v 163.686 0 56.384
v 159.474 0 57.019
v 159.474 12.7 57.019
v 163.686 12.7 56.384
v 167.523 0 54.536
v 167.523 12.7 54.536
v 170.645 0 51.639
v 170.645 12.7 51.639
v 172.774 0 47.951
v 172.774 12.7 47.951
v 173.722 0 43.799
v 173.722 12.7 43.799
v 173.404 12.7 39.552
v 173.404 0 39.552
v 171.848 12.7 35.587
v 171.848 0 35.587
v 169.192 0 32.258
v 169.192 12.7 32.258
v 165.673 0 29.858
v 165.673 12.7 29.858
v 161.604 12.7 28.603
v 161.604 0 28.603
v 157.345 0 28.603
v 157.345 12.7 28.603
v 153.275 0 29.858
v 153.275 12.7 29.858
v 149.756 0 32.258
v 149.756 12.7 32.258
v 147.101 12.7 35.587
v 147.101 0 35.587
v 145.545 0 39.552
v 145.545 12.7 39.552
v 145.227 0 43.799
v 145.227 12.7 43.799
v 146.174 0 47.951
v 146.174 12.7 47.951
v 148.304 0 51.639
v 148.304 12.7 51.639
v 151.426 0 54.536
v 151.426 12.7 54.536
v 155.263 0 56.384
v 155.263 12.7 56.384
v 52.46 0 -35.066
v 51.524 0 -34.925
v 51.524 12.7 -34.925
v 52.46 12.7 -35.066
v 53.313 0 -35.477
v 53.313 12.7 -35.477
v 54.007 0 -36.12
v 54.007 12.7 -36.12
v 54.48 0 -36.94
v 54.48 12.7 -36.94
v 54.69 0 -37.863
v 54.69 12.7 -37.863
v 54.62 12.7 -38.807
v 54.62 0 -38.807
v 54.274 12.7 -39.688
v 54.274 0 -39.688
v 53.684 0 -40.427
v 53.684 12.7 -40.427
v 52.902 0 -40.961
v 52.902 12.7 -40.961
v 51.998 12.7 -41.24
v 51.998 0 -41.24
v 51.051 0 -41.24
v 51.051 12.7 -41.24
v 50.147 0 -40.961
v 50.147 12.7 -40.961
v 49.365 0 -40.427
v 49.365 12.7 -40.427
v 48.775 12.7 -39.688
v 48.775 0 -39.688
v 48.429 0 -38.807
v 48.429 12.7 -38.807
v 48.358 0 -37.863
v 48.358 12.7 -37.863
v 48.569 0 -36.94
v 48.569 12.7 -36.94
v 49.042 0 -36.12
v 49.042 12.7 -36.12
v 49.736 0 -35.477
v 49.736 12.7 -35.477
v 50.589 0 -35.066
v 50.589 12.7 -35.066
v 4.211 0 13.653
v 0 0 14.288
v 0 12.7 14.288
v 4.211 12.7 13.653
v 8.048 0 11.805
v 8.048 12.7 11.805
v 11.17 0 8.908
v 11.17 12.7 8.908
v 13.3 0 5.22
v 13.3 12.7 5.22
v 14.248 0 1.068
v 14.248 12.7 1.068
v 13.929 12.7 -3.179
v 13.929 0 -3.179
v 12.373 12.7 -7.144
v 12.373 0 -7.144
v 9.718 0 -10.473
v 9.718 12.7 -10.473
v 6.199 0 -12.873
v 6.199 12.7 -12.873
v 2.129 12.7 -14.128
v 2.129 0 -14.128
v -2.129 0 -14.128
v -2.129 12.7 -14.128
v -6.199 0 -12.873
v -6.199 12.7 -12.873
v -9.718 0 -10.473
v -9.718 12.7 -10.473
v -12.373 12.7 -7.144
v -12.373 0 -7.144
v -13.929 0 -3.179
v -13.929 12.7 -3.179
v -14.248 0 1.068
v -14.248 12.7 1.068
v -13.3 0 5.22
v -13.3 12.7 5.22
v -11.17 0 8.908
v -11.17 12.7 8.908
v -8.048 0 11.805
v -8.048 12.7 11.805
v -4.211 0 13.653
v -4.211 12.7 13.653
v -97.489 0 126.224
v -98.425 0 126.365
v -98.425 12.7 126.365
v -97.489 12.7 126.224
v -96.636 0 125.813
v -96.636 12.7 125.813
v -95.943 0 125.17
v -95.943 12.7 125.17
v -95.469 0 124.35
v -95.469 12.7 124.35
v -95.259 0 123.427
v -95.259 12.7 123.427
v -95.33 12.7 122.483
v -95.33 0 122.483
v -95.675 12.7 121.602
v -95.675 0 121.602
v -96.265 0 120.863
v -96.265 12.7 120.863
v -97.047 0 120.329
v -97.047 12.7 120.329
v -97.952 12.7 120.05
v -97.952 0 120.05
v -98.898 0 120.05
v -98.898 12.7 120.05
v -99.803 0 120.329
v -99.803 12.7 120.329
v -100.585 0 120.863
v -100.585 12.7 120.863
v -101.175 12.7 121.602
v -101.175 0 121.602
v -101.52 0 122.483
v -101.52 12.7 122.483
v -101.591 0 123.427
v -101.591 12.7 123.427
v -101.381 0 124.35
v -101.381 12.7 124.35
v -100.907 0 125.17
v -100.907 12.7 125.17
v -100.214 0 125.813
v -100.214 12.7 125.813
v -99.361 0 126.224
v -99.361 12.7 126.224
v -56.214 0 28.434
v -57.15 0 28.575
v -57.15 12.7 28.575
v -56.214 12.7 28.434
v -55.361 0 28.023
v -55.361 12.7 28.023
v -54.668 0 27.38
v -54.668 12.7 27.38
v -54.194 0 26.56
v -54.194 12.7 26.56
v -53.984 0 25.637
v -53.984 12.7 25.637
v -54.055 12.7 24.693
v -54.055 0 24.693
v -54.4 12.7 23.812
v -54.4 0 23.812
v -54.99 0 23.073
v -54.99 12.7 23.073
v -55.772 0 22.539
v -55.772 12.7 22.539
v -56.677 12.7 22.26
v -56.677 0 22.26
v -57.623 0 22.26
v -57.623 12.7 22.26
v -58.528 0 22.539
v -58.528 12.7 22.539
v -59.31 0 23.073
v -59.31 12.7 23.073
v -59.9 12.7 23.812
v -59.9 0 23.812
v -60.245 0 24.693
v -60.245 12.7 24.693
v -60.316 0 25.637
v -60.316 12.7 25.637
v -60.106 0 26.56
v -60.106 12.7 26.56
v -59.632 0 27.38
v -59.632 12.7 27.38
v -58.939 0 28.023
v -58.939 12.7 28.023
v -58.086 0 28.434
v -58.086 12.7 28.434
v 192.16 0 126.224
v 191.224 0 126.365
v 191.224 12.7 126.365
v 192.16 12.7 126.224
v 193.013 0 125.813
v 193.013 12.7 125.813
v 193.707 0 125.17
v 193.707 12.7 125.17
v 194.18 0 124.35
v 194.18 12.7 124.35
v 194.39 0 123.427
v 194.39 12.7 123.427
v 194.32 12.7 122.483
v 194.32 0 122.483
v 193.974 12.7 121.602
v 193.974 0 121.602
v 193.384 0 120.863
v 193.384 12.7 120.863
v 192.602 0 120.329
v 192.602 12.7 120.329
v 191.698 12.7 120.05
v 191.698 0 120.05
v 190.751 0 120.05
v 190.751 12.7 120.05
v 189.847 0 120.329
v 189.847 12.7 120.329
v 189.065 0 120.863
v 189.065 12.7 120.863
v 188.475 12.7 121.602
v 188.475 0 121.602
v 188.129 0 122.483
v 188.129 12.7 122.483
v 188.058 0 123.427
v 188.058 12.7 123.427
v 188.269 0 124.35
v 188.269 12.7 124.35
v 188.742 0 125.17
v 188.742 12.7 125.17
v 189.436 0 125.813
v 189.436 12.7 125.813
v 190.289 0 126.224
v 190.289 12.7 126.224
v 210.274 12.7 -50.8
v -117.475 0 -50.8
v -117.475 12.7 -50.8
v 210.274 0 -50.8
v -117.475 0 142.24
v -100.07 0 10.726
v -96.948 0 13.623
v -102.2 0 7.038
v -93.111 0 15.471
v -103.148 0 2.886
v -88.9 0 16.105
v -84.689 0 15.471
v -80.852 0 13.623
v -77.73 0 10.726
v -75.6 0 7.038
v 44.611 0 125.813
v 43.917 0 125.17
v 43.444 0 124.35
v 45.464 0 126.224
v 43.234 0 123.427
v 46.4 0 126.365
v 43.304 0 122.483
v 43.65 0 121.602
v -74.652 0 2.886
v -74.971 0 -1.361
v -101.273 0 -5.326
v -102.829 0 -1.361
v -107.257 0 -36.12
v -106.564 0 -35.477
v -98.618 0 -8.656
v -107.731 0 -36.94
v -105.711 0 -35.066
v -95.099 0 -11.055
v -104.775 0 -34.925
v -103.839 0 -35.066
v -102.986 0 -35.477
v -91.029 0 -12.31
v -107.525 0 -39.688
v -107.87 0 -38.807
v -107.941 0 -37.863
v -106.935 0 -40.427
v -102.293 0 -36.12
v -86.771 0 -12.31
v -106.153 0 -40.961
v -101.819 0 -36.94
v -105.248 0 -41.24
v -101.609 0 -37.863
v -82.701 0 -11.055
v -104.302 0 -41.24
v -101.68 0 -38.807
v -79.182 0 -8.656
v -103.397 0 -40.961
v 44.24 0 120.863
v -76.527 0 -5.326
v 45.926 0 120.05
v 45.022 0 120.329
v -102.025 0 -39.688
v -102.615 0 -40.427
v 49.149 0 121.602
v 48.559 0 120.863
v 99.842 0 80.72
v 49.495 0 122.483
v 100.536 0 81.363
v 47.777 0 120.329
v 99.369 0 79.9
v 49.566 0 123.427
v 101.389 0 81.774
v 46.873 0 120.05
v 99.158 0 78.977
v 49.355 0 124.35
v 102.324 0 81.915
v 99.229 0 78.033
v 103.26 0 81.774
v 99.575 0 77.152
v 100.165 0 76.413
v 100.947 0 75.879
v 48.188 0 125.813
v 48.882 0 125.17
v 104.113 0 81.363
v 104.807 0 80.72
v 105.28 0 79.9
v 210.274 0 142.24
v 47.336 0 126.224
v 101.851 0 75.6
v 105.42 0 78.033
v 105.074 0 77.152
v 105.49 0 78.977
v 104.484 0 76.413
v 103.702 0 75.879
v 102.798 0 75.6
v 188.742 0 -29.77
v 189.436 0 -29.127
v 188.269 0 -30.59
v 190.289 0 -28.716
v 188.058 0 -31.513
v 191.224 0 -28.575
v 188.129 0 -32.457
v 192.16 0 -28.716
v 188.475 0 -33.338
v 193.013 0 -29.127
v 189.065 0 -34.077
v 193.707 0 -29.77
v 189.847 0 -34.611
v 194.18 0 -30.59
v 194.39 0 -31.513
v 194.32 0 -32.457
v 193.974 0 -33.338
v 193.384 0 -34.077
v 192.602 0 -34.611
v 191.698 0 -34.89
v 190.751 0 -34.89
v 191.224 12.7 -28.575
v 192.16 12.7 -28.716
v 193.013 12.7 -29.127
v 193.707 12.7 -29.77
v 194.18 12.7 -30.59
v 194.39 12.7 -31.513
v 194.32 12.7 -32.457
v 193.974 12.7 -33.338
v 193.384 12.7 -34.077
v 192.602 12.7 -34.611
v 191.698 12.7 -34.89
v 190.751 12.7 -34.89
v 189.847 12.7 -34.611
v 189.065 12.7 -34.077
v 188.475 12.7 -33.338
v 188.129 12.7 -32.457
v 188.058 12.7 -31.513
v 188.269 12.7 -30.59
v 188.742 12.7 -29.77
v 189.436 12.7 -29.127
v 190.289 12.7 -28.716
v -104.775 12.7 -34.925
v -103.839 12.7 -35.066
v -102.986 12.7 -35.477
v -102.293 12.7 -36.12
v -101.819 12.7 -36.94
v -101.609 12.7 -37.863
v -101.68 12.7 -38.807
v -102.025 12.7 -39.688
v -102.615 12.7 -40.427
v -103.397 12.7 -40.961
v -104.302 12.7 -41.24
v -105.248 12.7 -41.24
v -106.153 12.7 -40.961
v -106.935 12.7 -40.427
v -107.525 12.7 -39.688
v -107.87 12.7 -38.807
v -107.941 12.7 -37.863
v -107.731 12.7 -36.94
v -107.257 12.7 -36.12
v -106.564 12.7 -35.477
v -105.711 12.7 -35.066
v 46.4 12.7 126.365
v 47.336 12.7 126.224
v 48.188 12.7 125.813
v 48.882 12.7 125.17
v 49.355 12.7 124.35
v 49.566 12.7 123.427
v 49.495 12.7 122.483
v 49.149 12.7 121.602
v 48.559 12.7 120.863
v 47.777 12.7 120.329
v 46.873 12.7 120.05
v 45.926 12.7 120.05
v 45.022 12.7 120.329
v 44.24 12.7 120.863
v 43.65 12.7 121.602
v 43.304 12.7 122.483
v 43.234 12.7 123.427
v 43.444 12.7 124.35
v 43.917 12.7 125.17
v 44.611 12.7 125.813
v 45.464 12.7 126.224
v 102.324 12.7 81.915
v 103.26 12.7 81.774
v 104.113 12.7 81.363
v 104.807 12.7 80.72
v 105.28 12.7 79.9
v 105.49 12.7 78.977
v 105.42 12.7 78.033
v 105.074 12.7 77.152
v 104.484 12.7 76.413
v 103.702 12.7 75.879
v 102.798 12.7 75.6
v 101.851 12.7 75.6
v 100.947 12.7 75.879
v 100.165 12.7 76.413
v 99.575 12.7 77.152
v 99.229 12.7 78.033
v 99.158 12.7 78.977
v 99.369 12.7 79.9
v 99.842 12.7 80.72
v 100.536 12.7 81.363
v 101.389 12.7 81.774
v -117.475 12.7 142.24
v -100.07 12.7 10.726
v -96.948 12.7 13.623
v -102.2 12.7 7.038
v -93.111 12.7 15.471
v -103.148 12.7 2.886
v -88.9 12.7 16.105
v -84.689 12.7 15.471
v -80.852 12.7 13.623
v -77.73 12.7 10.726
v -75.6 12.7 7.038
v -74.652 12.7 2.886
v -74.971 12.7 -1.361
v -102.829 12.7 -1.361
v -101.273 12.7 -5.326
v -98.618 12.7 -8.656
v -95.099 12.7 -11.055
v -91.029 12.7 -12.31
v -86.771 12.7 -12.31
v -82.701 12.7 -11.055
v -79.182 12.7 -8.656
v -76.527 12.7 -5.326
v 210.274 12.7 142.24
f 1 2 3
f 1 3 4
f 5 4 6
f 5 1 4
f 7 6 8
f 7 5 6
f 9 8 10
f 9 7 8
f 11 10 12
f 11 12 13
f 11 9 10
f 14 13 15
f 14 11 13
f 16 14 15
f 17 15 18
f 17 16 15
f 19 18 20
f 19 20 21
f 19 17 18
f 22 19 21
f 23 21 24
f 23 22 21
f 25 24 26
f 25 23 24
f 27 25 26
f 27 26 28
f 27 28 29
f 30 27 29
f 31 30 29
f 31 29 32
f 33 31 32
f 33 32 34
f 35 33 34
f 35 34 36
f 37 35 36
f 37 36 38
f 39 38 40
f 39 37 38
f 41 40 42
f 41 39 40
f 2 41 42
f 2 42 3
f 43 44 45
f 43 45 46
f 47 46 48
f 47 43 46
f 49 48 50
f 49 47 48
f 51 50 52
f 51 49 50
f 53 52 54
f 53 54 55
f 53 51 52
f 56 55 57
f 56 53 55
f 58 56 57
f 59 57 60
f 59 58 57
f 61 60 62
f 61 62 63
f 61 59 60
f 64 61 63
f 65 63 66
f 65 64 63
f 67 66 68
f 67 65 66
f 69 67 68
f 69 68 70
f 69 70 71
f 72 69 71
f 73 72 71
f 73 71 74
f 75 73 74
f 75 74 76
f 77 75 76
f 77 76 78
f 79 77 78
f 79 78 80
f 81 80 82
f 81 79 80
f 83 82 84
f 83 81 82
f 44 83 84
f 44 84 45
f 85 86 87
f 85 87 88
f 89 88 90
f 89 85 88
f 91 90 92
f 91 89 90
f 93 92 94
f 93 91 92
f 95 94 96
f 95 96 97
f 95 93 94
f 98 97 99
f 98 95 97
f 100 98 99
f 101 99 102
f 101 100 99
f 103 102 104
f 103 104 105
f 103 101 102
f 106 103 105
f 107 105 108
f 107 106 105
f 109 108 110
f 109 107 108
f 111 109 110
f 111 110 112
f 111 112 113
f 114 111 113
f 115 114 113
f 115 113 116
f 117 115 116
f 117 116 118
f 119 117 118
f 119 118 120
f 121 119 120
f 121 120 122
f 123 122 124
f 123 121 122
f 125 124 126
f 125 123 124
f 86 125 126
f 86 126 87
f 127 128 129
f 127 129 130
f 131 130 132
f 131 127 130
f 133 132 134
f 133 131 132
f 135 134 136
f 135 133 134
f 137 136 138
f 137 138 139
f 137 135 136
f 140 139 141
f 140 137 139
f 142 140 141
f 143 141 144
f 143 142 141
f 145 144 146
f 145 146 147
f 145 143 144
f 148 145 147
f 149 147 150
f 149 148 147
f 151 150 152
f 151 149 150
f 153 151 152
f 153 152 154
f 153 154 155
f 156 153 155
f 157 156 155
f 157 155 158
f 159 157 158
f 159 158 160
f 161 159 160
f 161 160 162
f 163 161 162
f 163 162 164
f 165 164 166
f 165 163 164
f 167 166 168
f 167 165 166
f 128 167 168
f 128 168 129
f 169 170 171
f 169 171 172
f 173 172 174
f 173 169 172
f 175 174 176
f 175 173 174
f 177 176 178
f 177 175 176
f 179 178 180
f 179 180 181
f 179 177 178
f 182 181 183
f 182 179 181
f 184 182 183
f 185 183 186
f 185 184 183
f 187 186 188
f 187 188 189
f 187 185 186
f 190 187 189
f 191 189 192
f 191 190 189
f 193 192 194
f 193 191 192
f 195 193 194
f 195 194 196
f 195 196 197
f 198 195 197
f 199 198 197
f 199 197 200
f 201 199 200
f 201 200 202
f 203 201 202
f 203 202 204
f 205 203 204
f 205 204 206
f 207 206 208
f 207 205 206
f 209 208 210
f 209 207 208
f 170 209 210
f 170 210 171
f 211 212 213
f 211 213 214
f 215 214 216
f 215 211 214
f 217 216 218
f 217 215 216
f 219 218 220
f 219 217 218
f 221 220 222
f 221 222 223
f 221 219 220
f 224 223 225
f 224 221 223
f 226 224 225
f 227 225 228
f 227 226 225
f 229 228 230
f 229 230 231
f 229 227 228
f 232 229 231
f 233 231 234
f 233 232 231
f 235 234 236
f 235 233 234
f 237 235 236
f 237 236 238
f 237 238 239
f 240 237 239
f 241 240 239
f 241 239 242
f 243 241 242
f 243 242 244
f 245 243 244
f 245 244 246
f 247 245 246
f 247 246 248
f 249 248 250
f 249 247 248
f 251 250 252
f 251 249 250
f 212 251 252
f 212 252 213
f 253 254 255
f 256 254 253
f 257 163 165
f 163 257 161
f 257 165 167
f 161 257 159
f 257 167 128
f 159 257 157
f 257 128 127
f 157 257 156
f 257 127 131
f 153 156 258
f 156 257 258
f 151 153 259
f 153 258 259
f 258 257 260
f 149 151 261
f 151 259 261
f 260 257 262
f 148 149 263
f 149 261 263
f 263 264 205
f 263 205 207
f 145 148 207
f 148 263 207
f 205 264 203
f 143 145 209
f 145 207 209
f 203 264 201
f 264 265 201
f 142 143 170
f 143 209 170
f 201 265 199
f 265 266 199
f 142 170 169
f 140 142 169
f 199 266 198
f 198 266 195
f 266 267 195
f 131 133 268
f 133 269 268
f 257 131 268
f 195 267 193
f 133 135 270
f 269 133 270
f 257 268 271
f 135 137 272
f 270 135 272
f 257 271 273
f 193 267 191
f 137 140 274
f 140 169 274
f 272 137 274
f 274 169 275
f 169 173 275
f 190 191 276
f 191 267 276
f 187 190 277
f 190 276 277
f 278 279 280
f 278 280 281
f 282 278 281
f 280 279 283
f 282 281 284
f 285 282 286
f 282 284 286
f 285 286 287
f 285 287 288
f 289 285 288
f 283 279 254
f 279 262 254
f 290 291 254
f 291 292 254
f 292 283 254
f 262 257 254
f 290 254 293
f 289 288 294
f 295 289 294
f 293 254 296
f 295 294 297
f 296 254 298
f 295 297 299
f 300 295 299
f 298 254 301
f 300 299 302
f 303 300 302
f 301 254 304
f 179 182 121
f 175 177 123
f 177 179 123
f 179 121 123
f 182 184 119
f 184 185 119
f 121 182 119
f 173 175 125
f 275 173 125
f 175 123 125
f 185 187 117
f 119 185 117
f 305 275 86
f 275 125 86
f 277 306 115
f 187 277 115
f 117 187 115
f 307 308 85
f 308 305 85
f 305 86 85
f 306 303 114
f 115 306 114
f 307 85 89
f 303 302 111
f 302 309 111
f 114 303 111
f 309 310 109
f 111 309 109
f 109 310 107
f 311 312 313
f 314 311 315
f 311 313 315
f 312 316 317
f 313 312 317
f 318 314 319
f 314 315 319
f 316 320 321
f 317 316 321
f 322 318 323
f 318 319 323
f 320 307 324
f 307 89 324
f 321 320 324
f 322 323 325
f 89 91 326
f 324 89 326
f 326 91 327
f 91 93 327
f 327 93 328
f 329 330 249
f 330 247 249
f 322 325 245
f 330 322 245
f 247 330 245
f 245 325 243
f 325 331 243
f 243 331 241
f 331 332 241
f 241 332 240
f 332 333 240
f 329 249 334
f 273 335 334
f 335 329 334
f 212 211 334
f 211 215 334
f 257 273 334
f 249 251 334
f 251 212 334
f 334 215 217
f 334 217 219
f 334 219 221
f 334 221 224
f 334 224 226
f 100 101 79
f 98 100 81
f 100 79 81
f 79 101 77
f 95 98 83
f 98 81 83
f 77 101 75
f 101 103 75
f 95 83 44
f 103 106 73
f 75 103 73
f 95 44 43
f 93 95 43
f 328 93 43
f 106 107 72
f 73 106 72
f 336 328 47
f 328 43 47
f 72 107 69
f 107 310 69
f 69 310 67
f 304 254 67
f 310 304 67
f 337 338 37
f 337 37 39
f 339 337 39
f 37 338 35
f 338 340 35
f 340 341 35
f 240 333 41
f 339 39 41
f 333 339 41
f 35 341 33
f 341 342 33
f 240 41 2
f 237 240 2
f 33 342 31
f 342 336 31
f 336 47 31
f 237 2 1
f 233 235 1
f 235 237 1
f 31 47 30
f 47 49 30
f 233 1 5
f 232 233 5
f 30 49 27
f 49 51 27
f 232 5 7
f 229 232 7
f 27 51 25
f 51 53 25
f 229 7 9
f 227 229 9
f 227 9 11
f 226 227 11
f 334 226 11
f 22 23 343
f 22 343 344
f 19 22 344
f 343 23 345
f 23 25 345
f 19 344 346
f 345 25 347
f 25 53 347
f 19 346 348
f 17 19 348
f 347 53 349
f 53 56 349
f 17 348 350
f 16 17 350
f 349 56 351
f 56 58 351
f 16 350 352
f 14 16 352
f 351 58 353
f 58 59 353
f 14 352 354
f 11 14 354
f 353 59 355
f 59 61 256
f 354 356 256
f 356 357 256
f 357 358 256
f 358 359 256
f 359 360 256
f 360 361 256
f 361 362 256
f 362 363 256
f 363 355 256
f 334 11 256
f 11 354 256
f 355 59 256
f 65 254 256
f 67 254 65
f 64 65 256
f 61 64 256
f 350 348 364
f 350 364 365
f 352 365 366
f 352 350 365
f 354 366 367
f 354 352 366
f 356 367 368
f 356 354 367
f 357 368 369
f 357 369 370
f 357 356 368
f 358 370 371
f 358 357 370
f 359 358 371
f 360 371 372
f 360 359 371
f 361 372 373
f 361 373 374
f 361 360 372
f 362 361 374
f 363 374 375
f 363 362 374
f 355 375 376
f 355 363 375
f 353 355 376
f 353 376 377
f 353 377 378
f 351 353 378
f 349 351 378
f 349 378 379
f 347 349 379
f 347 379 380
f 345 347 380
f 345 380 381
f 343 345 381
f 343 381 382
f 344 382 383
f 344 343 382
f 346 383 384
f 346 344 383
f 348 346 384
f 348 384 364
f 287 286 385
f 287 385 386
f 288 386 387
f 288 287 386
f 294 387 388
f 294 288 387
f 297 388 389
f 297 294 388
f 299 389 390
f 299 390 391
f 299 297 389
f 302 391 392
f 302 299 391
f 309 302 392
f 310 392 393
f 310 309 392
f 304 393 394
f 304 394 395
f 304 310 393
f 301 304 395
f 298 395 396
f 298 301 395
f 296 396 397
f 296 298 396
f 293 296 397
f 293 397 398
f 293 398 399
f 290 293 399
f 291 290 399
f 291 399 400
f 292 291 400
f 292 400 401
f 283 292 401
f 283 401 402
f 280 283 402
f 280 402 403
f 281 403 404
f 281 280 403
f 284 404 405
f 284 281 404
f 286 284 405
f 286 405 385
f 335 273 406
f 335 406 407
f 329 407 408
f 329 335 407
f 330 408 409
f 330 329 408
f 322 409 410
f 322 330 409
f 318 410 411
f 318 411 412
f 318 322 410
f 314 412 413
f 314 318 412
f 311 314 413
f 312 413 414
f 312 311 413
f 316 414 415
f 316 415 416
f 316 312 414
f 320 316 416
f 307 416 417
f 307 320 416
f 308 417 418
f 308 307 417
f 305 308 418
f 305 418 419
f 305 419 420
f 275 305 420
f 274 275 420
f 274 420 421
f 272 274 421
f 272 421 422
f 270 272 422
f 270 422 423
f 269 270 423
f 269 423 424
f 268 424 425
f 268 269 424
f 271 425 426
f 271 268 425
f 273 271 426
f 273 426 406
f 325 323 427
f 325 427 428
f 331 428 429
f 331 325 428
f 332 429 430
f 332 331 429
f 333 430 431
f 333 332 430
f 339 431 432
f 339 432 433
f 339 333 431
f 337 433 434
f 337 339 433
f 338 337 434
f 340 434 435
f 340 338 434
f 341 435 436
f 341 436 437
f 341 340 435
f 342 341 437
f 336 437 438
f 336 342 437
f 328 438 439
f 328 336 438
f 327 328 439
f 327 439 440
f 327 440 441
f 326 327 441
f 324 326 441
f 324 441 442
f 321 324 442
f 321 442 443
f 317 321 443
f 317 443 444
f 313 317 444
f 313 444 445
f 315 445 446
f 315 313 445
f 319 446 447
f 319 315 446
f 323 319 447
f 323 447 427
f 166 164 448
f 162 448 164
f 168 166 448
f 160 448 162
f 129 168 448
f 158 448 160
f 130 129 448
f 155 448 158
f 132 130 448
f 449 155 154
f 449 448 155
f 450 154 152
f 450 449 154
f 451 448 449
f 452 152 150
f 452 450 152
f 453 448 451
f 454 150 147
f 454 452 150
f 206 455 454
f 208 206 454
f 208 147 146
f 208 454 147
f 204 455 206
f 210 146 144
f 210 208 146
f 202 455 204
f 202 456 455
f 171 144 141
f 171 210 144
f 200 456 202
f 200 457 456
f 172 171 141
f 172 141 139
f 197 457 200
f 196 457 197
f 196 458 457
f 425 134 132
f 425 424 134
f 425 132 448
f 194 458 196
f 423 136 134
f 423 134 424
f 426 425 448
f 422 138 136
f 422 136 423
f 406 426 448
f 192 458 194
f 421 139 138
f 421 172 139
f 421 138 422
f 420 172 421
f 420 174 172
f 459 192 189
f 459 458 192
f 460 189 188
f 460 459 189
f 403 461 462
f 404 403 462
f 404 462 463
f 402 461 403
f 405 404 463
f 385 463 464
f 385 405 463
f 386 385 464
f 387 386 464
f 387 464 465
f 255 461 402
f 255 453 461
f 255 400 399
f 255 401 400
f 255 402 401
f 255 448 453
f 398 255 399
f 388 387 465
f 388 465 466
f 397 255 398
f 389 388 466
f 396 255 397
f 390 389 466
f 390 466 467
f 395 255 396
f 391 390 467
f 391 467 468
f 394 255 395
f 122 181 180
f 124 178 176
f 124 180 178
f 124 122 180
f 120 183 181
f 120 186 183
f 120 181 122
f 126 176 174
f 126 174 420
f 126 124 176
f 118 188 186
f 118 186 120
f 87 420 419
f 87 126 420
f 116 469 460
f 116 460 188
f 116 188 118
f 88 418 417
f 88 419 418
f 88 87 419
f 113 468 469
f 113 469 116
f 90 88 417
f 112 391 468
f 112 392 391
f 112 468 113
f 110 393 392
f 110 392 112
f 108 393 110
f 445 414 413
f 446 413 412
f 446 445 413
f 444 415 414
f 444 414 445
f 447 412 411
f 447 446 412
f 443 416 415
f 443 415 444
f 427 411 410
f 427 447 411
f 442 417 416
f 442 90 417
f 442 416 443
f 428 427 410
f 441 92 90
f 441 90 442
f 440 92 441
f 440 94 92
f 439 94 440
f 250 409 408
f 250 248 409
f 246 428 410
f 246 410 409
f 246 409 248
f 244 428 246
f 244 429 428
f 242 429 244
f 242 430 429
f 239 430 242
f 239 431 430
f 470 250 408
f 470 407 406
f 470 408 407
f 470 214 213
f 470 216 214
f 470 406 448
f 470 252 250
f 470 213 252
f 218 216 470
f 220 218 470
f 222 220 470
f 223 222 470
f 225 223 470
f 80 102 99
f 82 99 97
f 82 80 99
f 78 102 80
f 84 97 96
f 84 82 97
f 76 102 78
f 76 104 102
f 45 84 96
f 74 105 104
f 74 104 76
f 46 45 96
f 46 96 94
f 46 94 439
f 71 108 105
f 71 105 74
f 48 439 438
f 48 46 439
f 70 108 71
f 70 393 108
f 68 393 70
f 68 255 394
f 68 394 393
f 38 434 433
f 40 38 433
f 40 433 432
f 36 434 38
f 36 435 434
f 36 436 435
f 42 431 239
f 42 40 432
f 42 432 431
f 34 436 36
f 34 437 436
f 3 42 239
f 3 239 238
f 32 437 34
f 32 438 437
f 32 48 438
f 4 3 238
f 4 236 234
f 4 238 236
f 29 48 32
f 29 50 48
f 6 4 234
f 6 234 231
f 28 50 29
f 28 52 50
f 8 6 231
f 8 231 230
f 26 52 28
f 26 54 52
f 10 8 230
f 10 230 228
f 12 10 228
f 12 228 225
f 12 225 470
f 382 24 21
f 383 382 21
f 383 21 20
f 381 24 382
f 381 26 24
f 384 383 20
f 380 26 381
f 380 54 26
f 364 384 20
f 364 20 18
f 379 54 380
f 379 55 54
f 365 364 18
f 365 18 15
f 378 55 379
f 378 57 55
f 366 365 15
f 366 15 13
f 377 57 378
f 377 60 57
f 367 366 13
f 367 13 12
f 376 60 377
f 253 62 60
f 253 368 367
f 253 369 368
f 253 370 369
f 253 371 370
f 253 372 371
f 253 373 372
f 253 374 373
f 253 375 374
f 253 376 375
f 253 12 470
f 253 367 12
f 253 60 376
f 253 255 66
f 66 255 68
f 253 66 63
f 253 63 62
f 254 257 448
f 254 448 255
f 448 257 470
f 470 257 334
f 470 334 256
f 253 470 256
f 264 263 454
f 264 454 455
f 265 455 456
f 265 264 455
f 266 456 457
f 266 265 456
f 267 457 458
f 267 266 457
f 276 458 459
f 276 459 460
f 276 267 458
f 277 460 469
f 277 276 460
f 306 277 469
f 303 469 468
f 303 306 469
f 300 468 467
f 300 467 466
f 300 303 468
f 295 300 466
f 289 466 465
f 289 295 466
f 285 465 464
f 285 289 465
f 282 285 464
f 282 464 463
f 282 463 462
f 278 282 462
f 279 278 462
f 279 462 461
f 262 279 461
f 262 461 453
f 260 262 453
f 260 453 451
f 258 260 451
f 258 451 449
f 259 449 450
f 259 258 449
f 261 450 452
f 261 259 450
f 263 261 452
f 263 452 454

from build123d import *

# Parameters (mm, degrees)
SKETCH1_W           = 327.74935392
SKETCH1_H           = 193.04
SKETCH1_R           = 14.2875
SKETCH1_R_2         = 3.175
BOSS_EXTRUDE1_DEPTH = 12.7


with BuildPart() as part:
    # Sketch1 → Boss-Extrude1 (new body)
    with BuildSketch(Plane(origin=(0, 0, 0), x_dir=(1, 0, 0), z_dir=(0, 1, 0))):
        with Locations((46.39967696, -45.72)):
            Rectangle(SKETCH1_W, SKETCH1_H)
        with Locations(Location((0, 0, 0), (0, 0, 270))):
            Circle(SKETCH1_R, mode=Mode.SUBTRACT)
        with Locations(Location((159.47435392, -42.731024346, 0), (0, 0, 270))):
            Circle(SKETCH1_R, mode=Mode.SUBTRACT)
        with Locations(Location((-88.9, -1.817931401, 0), (0, 0, 270))):
            Circle(SKETCH1_R, mode=Mode.SUBTRACT)
        with Locations(Location((-98.425, -123.19, 0), (0, 0, 270))):
            Circle(SKETCH1_R_2, mode=Mode.SUBTRACT)
        with Locations(Location((191.22435392, -123.19, 0), (0, 0, 270))):
            Circle(SKETCH1_R_2, mode=Mode.SUBTRACT)
        with Locations(Location((191.22435392, 31.75, 0), (0, 0, 270))):
            Circle(SKETCH1_R_2, mode=Mode.SUBTRACT)
        with Locations(Location((102.32435392, -78.74, 0), (0, 0, 270))):
            Circle(SKETCH1_R_2, mode=Mode.SUBTRACT)
        with Locations(Location((46.3996786, -123.19, 0), (0, 0, 270))):
            Circle(SKETCH1_R_2, mode=Mode.SUBTRACT)
        with Locations(Location((-57.15, -25.4, 0), (0, 0, 270))):
            Circle(SKETCH1_R_2, mode=Mode.SUBTRACT)
        with Locations(Location((-104.775, 38.1, 0), (0, 0, 270))):
            Circle(SKETCH1_R_2, mode=Mode.SUBTRACT)
        with Locations(Location((51.52435392, 38.1, 0), (0, 0, 270))):
            Circle(SKETCH1_R_2, mode=Mode.SUBTRACT)
    extrude(amount=BOSS_EXTRUDE1_DEPTH)


solid = part.part
